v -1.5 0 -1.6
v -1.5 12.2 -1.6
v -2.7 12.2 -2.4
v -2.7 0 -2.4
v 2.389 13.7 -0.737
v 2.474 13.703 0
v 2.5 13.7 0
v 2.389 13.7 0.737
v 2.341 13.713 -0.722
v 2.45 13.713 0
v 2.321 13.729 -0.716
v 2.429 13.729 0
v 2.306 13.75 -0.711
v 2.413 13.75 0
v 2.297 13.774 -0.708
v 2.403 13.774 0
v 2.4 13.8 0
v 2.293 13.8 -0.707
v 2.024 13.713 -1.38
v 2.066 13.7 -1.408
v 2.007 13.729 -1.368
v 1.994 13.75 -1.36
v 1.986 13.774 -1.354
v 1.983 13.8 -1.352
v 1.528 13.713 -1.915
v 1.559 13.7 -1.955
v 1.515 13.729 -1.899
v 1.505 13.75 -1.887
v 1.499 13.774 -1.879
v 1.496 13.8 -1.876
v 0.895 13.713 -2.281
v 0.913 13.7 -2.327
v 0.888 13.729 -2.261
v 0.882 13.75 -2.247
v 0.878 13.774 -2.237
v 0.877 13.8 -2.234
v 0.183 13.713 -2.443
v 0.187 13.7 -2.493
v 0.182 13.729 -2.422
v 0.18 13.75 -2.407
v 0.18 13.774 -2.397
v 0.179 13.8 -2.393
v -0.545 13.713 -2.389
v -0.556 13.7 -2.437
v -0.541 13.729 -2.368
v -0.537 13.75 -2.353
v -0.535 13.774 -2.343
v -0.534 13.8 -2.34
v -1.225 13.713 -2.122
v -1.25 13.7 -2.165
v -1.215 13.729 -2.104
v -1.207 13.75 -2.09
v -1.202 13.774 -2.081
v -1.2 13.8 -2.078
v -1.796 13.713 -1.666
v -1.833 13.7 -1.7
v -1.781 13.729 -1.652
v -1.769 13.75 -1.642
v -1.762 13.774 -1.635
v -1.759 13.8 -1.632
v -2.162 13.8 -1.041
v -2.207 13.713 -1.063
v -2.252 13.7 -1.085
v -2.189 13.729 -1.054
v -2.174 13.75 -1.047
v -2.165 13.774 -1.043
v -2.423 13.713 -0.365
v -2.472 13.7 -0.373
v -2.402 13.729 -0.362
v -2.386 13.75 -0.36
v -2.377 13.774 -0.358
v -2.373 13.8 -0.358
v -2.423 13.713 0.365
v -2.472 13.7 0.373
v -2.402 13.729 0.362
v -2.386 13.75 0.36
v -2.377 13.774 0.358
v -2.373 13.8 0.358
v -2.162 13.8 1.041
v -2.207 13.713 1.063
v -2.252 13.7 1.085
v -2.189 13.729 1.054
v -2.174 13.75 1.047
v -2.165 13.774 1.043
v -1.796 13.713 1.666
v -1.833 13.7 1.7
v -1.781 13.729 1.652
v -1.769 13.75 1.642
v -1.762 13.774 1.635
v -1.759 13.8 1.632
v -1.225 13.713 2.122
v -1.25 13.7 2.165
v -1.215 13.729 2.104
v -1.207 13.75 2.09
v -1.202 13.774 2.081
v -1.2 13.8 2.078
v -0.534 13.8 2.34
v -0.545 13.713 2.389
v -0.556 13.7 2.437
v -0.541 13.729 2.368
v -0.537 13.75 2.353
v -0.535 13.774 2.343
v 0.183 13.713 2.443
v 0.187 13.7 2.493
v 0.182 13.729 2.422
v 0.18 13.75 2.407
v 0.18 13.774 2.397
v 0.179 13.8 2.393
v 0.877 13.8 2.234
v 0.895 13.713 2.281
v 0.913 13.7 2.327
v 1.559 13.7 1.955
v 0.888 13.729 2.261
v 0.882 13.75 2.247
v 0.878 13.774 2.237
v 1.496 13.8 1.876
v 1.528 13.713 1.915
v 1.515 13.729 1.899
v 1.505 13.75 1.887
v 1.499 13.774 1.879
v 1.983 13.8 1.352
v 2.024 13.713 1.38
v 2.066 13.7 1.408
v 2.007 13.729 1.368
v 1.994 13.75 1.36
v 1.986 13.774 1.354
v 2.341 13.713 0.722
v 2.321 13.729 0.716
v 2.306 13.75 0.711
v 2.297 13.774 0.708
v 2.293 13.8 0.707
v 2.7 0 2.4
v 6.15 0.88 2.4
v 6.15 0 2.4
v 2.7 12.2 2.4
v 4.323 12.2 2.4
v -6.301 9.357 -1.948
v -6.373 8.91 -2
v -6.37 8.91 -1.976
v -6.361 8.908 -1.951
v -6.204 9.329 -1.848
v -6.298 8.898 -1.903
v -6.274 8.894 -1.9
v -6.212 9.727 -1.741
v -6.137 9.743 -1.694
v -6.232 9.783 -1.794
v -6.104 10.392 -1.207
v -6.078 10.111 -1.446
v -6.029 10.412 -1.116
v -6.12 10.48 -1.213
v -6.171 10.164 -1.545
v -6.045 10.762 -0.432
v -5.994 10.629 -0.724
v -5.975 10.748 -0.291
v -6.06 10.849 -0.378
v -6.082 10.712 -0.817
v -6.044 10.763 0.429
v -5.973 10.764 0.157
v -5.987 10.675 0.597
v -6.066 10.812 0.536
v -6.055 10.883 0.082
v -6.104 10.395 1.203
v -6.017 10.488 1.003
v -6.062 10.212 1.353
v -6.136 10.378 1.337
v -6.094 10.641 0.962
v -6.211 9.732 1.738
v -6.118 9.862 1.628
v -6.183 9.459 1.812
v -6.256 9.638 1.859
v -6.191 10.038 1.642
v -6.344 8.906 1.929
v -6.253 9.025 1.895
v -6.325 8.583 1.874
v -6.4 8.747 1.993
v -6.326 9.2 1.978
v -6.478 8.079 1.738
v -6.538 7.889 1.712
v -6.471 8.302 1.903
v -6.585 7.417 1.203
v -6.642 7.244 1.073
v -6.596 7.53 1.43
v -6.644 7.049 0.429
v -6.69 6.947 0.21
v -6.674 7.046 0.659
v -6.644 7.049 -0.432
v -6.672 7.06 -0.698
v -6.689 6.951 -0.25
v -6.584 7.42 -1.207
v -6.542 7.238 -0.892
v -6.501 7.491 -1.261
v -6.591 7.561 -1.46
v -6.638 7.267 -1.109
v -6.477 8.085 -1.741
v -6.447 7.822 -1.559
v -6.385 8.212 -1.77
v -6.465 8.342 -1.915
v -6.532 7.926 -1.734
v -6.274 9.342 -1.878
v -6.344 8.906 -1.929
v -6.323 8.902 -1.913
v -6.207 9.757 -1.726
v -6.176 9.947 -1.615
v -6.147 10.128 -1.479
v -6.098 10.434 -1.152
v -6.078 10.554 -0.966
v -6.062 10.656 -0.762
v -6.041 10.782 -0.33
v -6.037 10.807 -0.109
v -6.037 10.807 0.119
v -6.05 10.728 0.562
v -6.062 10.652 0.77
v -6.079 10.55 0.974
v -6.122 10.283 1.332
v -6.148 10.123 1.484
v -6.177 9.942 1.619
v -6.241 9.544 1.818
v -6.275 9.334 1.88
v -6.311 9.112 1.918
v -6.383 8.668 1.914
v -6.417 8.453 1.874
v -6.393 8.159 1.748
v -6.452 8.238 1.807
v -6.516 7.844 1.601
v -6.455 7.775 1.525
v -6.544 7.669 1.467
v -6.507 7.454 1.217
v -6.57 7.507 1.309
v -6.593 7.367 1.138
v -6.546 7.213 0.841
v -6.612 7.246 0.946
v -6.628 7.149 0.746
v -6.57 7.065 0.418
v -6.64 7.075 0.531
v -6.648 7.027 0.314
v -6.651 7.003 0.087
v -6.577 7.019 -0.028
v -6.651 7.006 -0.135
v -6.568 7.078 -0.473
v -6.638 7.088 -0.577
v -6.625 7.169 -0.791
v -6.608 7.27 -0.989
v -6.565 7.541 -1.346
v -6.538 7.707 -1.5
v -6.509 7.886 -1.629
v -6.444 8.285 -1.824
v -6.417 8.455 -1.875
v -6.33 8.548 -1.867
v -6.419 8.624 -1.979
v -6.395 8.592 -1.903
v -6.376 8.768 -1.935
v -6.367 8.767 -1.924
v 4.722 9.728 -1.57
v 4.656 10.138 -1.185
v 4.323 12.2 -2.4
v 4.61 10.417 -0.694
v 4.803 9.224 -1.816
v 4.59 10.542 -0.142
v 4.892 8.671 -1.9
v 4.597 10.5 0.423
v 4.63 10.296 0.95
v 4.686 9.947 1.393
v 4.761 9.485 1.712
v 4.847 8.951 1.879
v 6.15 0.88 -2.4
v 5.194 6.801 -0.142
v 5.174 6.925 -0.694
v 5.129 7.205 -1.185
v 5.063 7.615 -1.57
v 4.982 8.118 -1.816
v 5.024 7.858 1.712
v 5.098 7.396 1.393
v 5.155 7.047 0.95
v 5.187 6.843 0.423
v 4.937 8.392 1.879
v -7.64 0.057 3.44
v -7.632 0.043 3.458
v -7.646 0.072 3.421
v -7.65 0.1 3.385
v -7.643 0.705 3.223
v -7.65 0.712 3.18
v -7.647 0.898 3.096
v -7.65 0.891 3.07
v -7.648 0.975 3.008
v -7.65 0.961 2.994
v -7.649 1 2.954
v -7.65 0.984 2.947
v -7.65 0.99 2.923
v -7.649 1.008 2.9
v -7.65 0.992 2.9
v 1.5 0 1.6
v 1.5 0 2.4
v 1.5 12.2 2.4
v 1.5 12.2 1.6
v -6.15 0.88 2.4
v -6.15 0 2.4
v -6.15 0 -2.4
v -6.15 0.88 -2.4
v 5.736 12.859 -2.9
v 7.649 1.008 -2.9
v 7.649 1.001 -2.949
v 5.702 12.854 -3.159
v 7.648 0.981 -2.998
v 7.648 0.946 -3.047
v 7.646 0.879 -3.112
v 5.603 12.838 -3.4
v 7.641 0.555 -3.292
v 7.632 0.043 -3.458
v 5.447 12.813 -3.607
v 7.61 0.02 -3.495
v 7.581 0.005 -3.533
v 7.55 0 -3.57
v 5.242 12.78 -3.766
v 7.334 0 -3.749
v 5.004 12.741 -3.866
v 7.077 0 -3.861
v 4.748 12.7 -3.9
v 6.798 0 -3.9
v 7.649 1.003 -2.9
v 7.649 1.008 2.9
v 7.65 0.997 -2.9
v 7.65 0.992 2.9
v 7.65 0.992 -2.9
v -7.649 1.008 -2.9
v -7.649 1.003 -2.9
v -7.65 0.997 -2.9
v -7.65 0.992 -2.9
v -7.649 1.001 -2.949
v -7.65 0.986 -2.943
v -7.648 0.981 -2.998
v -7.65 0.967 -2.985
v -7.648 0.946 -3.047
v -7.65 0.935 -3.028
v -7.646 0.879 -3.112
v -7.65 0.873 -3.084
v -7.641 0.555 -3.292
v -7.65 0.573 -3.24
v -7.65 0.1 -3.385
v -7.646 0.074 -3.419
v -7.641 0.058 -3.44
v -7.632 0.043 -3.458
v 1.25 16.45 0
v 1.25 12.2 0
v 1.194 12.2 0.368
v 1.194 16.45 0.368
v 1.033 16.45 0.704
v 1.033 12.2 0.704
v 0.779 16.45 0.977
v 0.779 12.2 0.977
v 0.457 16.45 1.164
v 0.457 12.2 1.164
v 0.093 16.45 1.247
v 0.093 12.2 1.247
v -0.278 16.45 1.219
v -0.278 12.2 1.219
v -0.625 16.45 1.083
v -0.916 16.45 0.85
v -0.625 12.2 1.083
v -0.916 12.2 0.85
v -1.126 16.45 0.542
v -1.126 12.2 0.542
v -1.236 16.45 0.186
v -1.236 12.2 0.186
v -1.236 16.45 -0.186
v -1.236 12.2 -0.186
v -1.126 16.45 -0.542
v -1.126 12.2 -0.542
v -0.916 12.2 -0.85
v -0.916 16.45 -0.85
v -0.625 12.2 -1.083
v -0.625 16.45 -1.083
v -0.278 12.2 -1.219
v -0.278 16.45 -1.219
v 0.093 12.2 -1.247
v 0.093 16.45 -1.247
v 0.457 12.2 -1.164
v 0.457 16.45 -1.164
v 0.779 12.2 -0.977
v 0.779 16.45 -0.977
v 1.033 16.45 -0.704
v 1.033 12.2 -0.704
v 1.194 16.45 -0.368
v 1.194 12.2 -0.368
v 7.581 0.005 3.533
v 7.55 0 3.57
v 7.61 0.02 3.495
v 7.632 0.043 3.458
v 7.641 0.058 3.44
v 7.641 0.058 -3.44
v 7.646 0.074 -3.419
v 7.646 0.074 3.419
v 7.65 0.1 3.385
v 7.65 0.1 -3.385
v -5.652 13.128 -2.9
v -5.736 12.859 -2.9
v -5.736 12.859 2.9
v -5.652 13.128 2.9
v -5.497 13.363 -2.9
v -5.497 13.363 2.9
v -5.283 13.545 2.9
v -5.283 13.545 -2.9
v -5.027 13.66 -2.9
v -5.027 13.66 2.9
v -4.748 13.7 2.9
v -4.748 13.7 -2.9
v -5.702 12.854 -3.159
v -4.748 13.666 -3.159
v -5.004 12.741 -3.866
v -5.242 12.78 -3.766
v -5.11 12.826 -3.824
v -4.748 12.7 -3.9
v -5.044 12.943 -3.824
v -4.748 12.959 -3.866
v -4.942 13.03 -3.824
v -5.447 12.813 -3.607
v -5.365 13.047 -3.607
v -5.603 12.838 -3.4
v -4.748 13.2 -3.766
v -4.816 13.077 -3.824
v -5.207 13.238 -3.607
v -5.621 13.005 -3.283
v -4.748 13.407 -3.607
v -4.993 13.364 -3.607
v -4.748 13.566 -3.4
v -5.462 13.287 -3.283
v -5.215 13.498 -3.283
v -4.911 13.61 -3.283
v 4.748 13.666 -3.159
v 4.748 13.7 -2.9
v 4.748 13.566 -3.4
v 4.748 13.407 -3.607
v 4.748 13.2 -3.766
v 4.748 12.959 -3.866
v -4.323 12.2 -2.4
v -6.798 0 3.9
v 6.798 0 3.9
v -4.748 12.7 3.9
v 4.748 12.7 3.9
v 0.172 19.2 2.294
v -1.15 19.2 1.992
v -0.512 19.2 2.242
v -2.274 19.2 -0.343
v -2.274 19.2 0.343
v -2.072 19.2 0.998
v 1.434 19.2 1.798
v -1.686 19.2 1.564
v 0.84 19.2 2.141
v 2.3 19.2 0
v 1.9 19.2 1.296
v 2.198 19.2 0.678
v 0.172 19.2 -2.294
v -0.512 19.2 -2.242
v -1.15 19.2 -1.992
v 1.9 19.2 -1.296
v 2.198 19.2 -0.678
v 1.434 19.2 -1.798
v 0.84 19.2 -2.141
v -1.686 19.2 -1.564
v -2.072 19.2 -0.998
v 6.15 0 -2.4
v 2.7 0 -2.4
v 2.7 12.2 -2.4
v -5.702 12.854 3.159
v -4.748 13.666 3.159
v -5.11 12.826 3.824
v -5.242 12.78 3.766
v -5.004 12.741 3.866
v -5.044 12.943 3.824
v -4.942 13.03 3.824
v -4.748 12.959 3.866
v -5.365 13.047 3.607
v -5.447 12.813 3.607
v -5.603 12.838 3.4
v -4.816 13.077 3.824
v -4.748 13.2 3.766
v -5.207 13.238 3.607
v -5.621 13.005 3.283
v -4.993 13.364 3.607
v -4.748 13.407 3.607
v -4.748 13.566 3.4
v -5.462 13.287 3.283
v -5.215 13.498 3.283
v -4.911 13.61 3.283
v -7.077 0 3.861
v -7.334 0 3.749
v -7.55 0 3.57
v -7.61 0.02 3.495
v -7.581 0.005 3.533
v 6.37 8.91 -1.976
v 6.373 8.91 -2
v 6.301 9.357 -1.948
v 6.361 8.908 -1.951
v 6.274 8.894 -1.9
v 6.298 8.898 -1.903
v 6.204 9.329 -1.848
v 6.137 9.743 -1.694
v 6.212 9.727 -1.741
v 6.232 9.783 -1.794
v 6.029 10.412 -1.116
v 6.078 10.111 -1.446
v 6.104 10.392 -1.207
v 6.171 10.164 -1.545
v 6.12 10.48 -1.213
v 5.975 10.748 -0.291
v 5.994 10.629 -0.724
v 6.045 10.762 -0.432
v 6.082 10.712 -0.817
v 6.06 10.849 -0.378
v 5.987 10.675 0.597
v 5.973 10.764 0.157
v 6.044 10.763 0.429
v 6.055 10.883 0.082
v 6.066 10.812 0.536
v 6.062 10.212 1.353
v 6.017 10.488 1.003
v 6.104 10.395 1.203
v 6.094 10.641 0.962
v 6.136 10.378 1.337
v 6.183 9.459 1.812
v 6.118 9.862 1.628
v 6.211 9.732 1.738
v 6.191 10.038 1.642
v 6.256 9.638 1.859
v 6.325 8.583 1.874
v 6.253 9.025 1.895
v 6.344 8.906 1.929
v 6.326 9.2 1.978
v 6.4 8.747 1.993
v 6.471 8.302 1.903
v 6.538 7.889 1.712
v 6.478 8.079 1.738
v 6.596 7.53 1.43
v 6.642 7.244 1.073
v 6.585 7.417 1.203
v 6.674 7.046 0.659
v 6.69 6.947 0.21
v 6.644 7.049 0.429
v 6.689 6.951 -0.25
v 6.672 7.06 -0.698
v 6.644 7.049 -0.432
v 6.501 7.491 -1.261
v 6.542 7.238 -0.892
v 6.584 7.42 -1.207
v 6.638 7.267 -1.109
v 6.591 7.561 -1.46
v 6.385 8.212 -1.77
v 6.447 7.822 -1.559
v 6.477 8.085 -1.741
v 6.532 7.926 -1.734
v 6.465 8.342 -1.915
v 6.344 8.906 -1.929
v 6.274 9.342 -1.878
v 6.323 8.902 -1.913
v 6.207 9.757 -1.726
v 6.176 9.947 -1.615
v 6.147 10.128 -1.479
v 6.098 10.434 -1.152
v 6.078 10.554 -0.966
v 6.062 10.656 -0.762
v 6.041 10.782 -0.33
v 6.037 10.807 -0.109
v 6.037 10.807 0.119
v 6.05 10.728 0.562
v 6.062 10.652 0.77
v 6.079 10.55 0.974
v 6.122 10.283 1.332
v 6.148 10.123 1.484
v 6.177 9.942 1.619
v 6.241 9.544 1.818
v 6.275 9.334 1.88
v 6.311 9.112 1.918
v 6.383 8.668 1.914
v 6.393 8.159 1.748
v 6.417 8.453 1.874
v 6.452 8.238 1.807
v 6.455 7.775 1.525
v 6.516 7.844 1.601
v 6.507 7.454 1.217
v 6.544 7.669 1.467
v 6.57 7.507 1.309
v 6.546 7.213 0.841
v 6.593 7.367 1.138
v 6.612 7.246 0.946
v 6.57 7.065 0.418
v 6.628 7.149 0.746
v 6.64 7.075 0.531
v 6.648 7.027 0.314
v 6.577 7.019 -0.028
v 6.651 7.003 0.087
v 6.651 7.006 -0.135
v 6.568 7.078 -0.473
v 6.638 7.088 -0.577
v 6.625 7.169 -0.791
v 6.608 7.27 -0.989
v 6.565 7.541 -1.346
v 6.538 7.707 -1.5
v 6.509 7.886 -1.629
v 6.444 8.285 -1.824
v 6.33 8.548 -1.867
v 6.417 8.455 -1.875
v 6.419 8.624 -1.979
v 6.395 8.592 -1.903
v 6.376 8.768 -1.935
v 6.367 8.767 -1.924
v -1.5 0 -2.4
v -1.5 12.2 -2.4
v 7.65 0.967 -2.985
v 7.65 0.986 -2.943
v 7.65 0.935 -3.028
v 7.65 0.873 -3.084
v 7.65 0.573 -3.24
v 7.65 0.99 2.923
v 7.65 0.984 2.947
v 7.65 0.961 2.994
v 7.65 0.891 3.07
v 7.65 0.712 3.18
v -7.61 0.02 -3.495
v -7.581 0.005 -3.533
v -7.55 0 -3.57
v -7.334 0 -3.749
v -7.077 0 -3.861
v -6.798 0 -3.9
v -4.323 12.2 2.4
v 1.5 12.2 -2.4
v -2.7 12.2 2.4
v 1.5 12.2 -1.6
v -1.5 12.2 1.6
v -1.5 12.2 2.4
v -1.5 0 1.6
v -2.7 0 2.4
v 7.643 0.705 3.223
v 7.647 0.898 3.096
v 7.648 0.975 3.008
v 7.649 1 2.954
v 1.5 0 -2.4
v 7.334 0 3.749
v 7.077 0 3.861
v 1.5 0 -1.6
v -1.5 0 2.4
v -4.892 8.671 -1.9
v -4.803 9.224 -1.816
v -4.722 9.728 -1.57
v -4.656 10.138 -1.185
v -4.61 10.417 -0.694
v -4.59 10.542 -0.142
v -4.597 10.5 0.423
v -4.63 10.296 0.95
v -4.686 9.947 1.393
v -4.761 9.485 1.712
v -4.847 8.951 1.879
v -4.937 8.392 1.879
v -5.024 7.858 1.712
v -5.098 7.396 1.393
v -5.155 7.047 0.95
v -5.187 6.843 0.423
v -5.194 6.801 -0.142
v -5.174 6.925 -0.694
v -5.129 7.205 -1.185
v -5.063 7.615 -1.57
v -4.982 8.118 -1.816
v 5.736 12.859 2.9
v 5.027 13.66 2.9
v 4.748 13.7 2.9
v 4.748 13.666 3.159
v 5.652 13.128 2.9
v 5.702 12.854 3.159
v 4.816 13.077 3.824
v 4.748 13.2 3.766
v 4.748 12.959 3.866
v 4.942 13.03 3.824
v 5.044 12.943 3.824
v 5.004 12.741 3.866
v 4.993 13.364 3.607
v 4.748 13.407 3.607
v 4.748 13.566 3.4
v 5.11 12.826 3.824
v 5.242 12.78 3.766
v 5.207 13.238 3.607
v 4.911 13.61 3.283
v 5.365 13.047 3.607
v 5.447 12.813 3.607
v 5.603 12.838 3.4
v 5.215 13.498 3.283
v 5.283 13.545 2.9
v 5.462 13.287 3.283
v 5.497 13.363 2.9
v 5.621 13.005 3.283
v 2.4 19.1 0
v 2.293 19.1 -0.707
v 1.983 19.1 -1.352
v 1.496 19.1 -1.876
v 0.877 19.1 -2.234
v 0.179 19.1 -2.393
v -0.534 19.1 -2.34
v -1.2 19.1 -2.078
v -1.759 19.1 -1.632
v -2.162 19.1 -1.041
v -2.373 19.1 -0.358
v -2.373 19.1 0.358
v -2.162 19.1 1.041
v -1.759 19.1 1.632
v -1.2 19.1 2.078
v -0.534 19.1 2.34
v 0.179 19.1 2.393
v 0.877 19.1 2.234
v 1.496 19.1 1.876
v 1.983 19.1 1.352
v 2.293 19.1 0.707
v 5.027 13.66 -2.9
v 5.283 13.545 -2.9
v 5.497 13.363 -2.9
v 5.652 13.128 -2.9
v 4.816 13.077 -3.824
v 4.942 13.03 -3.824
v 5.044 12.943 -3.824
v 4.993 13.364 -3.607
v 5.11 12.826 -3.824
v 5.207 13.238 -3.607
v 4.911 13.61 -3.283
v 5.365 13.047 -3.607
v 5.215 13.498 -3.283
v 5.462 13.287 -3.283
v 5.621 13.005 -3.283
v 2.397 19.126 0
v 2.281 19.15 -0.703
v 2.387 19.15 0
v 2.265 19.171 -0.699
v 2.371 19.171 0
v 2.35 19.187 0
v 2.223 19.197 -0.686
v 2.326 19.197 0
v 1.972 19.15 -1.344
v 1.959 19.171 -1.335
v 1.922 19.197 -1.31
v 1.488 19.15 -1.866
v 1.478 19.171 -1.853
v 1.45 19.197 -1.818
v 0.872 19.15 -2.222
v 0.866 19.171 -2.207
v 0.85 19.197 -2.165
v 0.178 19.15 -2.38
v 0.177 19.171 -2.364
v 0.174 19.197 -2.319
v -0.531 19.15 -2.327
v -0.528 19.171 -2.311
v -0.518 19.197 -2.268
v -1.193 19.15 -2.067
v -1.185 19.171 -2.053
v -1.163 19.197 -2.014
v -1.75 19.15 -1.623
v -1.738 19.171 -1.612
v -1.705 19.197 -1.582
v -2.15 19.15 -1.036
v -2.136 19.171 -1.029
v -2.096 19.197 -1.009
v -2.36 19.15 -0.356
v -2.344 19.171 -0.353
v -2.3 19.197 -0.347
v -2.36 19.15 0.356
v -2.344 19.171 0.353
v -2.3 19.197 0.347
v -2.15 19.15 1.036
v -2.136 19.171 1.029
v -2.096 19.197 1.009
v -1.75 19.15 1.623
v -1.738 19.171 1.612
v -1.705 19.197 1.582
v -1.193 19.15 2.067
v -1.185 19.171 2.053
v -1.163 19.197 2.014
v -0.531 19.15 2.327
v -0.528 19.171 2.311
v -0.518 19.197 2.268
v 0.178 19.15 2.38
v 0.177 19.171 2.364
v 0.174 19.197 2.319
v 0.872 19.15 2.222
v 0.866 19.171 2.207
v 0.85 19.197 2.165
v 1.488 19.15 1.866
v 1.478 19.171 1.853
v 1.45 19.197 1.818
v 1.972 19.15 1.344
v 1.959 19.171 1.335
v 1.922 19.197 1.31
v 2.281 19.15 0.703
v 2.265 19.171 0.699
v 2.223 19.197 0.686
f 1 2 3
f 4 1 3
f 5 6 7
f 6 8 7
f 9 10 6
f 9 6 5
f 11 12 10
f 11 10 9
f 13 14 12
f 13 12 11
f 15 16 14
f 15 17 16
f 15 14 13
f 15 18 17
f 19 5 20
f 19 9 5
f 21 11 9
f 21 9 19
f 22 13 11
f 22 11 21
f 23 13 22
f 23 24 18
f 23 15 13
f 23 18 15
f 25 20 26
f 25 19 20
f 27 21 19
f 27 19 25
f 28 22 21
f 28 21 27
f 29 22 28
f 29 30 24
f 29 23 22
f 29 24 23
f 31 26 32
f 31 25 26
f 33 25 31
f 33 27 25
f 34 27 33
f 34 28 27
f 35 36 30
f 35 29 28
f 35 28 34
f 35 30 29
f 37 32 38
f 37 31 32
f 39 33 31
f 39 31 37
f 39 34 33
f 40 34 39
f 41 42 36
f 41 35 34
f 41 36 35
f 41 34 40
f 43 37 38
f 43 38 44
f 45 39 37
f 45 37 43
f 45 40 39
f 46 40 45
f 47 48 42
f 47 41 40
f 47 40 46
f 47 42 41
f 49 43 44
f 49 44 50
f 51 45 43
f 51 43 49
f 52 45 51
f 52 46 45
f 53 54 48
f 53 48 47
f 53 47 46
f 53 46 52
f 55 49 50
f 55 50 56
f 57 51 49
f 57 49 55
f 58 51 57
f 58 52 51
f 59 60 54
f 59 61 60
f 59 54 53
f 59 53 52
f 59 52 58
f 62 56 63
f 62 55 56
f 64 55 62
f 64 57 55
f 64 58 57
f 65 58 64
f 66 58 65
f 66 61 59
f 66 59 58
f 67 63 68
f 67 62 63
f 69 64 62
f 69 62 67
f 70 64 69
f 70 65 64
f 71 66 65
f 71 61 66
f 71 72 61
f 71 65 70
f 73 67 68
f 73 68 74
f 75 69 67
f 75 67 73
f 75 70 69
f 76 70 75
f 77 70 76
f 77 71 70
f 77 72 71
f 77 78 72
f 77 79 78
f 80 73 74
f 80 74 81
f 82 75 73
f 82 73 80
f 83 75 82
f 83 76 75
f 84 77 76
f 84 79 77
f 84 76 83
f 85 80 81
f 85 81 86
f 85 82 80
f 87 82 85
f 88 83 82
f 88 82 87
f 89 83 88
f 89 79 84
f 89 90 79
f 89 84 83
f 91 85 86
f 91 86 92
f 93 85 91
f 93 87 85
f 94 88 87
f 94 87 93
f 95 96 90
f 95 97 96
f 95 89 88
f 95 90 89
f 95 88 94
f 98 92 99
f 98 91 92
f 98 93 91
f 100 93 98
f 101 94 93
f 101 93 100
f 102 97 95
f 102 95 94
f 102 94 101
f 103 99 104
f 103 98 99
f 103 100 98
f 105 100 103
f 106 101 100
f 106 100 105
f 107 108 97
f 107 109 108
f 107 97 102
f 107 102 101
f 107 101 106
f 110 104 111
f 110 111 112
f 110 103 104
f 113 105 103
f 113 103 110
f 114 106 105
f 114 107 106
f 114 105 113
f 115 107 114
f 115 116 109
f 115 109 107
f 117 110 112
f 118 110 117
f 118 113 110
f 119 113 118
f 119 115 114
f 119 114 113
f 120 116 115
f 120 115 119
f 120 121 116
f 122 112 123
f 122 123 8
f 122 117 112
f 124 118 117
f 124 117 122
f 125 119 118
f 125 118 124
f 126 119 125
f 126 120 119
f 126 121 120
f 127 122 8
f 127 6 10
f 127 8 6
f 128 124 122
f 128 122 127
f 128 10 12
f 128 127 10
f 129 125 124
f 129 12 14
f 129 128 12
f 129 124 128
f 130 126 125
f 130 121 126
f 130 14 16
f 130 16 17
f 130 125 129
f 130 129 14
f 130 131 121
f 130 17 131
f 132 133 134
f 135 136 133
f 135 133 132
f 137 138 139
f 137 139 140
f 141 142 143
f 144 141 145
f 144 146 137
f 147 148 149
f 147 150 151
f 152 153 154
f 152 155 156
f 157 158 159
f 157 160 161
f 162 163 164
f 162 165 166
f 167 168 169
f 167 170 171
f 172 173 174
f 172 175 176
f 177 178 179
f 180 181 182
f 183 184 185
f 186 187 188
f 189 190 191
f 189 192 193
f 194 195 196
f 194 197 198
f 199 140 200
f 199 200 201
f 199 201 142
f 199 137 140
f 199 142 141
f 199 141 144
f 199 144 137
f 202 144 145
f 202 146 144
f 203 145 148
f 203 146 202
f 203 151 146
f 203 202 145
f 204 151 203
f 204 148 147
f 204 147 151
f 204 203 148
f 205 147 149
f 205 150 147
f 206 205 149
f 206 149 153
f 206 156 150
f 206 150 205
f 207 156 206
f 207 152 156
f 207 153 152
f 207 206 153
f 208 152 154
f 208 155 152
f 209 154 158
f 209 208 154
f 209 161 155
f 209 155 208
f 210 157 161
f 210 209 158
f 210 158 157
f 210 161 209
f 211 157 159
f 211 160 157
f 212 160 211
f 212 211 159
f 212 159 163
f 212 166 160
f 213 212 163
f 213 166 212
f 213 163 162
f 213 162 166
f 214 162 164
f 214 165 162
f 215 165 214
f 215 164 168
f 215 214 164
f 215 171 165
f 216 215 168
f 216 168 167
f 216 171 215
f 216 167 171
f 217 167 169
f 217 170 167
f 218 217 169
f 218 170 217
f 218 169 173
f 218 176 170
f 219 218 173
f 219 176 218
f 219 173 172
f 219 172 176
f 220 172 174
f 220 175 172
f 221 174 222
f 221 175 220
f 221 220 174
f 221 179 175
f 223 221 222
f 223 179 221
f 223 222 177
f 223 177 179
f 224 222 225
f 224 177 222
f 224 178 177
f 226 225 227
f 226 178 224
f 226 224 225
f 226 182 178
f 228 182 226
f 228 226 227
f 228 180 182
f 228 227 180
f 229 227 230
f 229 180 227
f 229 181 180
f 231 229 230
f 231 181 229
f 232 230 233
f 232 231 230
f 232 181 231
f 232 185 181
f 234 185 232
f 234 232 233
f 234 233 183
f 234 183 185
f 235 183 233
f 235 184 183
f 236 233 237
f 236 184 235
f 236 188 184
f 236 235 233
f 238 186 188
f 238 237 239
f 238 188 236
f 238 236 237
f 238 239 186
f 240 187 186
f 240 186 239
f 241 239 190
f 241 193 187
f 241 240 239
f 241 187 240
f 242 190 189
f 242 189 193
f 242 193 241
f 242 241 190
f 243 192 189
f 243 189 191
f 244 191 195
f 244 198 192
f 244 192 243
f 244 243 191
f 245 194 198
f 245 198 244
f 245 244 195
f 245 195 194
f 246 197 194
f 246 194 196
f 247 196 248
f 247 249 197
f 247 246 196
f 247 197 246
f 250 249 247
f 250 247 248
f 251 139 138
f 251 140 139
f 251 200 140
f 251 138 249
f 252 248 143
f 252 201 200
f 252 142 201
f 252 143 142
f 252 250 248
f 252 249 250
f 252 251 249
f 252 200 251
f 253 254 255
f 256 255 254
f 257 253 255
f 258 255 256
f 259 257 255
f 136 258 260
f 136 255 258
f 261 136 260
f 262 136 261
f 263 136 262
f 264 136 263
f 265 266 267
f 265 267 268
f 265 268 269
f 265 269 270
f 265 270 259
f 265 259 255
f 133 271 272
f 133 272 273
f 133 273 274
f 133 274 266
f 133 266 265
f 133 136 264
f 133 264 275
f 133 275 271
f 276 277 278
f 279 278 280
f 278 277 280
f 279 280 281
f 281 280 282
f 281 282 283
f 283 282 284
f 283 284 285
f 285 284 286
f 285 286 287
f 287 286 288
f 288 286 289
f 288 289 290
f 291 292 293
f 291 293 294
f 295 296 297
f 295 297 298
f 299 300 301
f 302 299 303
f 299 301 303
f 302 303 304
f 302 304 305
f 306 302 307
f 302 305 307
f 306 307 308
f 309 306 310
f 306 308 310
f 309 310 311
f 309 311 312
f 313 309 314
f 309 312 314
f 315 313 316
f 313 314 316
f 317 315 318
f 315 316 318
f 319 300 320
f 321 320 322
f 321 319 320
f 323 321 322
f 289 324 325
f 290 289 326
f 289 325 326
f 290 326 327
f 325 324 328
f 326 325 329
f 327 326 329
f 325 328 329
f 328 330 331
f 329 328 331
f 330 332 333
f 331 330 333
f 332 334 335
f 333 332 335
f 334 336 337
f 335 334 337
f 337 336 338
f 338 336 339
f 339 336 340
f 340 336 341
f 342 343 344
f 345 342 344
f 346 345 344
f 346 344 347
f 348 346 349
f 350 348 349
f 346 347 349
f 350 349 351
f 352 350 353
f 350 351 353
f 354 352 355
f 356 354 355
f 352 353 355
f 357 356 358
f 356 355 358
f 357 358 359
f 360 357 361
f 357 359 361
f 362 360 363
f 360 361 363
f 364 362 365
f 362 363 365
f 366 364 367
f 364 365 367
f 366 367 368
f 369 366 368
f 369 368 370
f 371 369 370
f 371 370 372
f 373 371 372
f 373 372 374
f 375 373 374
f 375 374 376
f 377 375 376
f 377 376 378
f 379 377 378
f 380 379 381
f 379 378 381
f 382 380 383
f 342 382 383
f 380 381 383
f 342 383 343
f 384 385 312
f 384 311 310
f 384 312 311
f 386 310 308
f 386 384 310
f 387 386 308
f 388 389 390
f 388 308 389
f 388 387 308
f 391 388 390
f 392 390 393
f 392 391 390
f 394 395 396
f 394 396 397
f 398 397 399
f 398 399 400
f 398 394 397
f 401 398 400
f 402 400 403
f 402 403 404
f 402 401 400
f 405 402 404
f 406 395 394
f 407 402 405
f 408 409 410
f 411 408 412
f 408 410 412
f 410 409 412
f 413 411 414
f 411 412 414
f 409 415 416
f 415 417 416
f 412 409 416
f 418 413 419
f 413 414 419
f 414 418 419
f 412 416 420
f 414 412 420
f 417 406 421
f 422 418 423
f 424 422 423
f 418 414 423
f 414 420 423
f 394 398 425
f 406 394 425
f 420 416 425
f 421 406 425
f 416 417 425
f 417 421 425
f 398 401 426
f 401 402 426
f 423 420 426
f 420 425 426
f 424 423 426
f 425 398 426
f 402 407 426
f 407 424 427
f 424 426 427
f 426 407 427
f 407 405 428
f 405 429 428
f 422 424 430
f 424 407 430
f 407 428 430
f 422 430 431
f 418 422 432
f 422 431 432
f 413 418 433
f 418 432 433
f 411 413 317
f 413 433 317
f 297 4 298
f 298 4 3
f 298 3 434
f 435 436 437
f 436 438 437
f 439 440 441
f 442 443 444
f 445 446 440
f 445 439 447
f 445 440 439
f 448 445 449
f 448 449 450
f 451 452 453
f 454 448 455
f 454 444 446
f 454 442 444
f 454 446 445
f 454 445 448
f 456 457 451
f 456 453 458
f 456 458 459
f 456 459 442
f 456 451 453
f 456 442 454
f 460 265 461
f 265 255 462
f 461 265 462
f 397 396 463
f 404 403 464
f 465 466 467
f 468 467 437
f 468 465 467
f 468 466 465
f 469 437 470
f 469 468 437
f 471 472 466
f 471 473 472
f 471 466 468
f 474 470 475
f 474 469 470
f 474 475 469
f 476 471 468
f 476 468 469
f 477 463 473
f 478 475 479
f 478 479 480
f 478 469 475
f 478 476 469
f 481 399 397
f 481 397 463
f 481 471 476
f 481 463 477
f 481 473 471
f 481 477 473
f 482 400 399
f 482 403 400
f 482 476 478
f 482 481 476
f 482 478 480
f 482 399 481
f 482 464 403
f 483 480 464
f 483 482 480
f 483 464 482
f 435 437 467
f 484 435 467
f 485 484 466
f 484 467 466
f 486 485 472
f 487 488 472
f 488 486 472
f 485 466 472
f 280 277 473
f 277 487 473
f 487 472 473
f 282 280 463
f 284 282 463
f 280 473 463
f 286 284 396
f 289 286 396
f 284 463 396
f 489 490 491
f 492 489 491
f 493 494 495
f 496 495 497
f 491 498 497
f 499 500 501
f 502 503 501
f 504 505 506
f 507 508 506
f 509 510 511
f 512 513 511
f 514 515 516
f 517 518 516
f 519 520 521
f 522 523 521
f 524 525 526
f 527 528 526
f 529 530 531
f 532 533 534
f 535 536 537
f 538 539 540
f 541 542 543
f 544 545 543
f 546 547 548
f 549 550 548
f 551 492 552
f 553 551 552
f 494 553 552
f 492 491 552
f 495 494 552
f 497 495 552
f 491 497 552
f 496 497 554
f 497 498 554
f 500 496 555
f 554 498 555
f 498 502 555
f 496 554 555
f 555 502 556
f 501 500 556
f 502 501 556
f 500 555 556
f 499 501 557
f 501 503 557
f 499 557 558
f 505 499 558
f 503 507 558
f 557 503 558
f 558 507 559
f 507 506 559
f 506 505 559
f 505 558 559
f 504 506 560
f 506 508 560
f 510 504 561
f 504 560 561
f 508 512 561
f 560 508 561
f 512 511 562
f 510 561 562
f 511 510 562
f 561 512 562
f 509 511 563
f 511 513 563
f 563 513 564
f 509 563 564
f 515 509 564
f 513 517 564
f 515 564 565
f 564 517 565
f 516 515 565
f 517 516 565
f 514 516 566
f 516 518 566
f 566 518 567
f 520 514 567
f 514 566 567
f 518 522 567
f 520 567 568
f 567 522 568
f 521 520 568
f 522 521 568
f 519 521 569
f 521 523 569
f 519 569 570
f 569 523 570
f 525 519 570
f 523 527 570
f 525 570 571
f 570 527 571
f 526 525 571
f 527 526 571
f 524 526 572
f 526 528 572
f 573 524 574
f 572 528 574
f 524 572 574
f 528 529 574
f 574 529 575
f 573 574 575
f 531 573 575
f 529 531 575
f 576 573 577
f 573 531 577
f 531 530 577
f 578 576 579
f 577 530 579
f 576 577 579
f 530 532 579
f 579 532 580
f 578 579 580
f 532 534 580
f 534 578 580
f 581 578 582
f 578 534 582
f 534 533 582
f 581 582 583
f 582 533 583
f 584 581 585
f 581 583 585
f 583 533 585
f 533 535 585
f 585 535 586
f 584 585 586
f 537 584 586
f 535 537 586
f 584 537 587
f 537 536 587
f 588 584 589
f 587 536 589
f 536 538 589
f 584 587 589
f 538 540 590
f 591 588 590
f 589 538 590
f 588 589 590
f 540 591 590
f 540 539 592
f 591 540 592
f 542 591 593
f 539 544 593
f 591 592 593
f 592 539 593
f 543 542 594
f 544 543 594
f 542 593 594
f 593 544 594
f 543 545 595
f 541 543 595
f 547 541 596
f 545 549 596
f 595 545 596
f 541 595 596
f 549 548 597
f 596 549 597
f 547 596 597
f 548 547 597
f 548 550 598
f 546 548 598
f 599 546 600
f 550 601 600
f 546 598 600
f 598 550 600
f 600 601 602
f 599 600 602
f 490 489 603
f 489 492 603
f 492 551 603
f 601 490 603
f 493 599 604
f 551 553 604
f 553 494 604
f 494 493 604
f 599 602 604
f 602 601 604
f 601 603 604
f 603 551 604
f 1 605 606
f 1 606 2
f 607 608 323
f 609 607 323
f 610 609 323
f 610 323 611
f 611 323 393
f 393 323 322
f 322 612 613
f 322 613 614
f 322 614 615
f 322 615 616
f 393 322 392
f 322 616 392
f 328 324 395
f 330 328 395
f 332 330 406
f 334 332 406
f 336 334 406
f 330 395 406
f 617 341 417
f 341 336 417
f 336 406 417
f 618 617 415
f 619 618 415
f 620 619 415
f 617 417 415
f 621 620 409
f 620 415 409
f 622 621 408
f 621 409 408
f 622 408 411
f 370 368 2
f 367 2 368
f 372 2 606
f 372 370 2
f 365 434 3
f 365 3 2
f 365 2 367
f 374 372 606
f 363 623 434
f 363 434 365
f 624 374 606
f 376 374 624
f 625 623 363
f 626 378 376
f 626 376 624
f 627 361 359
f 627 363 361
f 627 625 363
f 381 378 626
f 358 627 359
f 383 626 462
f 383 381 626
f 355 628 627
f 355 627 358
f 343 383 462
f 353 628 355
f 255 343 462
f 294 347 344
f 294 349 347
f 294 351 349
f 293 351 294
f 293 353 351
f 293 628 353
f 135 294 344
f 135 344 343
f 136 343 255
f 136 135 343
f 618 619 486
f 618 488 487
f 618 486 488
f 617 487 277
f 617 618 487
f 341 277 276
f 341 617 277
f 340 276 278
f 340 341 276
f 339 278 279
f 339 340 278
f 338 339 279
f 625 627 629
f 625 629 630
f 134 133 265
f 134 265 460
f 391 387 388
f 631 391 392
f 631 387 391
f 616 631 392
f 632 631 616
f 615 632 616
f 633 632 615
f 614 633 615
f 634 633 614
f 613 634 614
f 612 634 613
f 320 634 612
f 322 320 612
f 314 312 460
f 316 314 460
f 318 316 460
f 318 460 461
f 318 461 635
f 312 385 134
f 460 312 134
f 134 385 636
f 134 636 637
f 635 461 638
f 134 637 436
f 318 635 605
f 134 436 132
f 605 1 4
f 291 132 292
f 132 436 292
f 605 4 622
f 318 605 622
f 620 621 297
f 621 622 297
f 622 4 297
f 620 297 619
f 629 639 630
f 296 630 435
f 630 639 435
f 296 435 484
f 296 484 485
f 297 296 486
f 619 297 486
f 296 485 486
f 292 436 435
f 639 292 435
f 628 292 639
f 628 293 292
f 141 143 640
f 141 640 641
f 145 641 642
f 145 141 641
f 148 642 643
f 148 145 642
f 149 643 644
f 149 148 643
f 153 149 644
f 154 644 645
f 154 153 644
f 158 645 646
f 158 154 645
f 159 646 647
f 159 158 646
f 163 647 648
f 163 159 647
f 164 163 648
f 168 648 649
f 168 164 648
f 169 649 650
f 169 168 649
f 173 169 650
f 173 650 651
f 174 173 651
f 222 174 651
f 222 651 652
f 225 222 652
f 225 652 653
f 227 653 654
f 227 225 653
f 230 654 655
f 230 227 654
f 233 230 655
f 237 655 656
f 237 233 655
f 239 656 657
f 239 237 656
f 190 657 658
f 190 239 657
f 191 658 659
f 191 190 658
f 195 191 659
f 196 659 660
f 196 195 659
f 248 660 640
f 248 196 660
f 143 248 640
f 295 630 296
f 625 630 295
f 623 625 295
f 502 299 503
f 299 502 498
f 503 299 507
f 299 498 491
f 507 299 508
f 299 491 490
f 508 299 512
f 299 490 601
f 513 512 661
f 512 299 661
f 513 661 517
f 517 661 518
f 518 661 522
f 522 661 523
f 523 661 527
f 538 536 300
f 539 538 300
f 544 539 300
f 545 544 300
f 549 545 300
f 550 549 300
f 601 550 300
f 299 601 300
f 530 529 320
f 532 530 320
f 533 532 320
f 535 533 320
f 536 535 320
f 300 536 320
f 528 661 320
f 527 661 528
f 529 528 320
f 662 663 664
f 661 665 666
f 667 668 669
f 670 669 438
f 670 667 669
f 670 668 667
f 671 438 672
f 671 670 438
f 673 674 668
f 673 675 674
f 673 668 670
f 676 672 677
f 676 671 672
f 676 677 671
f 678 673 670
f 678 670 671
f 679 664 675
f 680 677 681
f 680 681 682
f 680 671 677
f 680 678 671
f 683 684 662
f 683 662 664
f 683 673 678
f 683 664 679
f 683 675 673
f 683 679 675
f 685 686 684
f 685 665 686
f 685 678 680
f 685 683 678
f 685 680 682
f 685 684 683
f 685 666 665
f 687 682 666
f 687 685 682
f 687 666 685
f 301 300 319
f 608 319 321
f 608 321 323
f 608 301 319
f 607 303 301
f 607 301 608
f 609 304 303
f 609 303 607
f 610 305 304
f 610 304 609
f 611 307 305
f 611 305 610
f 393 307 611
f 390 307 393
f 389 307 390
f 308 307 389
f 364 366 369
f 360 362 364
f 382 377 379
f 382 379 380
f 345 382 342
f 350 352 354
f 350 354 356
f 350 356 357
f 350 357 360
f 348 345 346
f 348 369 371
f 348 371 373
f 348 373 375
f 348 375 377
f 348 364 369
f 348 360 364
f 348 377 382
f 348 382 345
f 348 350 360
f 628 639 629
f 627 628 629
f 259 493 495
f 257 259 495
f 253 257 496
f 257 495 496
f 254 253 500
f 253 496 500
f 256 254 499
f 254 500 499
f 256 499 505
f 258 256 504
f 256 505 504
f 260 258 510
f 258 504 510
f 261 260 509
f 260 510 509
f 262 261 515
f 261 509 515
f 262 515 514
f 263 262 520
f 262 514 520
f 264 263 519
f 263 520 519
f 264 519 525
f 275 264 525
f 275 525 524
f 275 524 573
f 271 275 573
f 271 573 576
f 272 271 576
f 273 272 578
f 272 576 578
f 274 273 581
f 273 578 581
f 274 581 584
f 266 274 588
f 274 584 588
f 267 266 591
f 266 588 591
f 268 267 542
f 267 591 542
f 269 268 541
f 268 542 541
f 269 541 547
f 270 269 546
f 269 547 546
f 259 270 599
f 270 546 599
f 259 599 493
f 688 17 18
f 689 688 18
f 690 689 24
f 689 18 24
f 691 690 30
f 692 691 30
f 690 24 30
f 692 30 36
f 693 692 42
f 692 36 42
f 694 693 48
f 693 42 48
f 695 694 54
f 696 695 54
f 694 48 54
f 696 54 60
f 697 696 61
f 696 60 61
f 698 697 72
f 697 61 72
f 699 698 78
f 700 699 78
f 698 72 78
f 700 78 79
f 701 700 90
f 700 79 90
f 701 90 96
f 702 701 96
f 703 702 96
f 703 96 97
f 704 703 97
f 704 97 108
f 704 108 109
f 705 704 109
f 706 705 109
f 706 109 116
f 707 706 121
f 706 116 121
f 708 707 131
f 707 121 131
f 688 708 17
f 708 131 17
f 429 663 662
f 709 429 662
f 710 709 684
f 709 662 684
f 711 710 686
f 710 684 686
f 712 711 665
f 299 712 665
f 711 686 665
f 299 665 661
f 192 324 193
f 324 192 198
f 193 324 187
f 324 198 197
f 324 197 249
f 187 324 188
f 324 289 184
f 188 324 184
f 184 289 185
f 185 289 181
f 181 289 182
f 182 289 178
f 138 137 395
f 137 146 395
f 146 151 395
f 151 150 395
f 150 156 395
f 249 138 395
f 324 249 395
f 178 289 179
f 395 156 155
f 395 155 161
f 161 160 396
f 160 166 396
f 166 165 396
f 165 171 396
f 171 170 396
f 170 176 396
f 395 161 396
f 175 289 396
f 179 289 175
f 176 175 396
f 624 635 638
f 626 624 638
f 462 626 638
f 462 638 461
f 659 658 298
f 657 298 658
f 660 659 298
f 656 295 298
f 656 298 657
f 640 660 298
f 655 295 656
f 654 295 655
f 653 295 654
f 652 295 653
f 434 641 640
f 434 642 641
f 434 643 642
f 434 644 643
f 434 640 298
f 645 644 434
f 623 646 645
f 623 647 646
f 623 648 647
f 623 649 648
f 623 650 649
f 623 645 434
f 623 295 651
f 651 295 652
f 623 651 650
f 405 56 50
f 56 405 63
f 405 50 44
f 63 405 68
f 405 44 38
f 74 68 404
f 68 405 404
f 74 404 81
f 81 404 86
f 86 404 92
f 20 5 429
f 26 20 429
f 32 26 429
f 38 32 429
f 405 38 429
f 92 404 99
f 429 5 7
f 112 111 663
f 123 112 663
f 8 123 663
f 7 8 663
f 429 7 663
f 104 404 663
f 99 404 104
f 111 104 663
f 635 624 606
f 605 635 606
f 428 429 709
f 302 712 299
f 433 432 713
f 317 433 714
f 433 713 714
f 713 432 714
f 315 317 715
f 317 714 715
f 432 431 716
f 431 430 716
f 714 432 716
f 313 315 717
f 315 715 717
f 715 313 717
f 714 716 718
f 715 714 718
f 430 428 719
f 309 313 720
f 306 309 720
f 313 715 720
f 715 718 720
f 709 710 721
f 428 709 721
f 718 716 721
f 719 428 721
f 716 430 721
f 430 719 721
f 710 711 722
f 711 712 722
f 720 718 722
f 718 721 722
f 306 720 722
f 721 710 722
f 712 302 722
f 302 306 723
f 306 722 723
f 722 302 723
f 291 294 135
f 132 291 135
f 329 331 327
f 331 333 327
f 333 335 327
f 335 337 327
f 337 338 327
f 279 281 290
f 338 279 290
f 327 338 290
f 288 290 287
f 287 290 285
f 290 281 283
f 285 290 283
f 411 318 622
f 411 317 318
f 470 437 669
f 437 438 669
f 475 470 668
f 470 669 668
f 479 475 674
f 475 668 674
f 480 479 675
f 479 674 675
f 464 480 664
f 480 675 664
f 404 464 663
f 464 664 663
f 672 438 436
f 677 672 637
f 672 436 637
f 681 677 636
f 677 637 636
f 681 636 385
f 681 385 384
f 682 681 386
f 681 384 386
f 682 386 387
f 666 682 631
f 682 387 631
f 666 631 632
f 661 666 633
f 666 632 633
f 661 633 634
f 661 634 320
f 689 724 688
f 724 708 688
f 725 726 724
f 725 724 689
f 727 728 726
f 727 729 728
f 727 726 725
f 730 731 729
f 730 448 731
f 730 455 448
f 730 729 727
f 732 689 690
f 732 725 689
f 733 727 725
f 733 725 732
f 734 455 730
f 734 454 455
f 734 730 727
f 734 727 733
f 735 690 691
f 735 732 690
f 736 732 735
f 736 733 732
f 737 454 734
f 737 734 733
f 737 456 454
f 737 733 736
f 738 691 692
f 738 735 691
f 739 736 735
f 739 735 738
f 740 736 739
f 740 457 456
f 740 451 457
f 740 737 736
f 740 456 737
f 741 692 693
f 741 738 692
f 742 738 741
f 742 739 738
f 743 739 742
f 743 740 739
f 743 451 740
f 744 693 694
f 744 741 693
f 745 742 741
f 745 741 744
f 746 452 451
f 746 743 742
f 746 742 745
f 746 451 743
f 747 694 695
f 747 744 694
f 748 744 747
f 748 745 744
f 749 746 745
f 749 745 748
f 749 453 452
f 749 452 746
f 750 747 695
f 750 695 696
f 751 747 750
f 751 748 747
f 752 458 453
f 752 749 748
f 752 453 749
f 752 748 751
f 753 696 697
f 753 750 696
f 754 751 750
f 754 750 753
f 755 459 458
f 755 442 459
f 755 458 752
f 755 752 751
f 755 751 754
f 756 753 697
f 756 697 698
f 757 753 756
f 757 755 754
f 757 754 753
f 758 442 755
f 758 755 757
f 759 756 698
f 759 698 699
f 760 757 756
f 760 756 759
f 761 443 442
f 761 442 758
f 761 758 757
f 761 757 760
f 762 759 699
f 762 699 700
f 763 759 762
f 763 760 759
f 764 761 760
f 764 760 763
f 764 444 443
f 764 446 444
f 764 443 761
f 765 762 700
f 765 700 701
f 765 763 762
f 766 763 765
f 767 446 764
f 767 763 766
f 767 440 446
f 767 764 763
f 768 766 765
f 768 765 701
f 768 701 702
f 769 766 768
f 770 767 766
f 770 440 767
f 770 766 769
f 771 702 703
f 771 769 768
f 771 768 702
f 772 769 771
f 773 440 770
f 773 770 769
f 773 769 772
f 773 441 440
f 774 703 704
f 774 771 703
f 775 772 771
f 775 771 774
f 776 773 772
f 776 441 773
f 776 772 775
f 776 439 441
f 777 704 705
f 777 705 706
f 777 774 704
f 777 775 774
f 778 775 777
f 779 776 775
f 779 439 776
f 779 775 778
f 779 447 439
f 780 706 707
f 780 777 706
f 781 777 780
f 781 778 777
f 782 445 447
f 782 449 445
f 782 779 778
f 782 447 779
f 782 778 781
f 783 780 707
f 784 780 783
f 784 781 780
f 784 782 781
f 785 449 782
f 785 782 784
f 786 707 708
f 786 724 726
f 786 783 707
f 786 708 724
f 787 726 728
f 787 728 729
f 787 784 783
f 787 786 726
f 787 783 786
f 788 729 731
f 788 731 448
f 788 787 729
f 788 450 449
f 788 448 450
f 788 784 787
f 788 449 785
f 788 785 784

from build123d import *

# Parameters (mm, degrees)
SALIENTE_EXTRUIR1_DEPTH = 3.9
VACIADO1_T              = -1.5
CROQUIS2_R              = 1.9
CORTAR_EXTRUIR1_DEPTH   = 1.5
SALIENTE_EXTRUIR2_DEPTH = 12.2
CROQUIS4_R              = 2.4
SALIENTE_EXTRUIR3_DEPTH = 5.5
CROQUIS5_R              = 1.25
CORTAR_EXTRUIR2_DEPTH   = 4.25
REDONDEO1_R             = 1
REDONDEO2_R             = 0.1


with BuildPart() as part:
    # Croquis1 → Saliente-Extruir1 (new body, symmetric)
    with BuildSketch(Plane.XY):
        Polygon((7.65, 0), (-7.65, 0), (-7.65, 1), (-5.6, 13.7), (5.6, 13.7), (7.65, 1), align=None)
    extrude(amount=SALIENTE_EXTRUIR1_DEPTH, both=True)

    # Vaciado1
    vaciado1_openings = [part.faces().sort_by_distance(p)[0] for p in [
        (0, 0, 0),
    ]]
    offset(amount=VACIADO1_T, openings=vaciado1_openings, kind=Kind.INTERSECTION)

    # Croquis2 → Cortar-Extruir1 (cut)
    with BuildSketch(Plane(origin=(7.613054972, 1.228878952, 0), x_dir=(0, 0, -1), z_dir=(0.987221404, 0.159354636, 0))):
        with Locations((0, 7.780937034)):
            Circle(CROQUIS2_R)
    cortar_extruir1 = extrude(amount=-CORTAR_EXTRUIR1_DEPTH, mode=Mode.SUBTRACT)

    # Simetría1: Cortar-Extruir1 across plane
    add(cortar_extruir1.mirror(Plane(origin=(0, 0, 0), x_dir=(0, 0, 1), z_dir=(1, 0, 0))), mode=Mode.SUBTRACT)

    # Croquis3 → Saliente-Extruir2 (add)
    with BuildSketch(Plane.XZ):
        Polygon((1.5, 2.4), (1.5, 1.6), (2.7, 2.4), align=None)
        Polygon((-1.5, 1.6), (-2.7, 2.4), (-1.5, 2.4), align=None)
    saliente_extruir2 = extrude(amount=-SALIENTE_EXTRUIR2_DEPTH)

    # Simetría2: Saliente-Extruir2 across plane
    add(saliente_extruir2.mirror(Plane.XY))

    # Croquis4 → Saliente-Extruir3 (add)
    with BuildSketch(Plane(origin=(0, 13.7, 0), x_dir=(1, 0, 0), z_dir=(0, 1, 0))):
        Circle(CROQUIS4_R)
    extrude(amount=SALIENTE_EXTRUIR3_DEPTH)

    # Croquis5 → Cortar-Extruir2 (cut)
    with BuildSketch(Plane.XZ.offset(-12.2)):
        Circle(CROQUIS5_R)
    extrude(amount=-CORTAR_EXTRUIR2_DEPTH, mode=Mode.SUBTRACT)

    # Redondeo1
    redondeo1_edges = [part.edges().sort_by_distance(p)[0] for p in [
        (6.625, 7.35, -3.9),
        (-6.625, 7.35, -3.9),
        (-6.625, 7.35, 3.9),
        (6.625, 7.35, 3.9),
        (5.6, 13.7, 0),
        (0, 13.7, -3.9),
        (0, 13.7, 3.9),
        (-5.6, 13.7, 0),
    ]]
    fillet(redondeo1_edges, radius=REDONDEO1_R)

    # Redondeo2
    redondeo2_edges = [part.edges().sort_by_distance(p)[0] for p in [
        (-7.65, 0.566832693, 3.265088592),
        (-7.65, 0, 0),
        (-7.65, 0.566832693, -3.265088592),
        (-7.65, 1, 0),
        (7.65, 0.566832693, 3.265088592),
        (7.65, 1, 0),
        (7.65, 0.566832693, -3.265088592),
        (7.65, 0, 0),
        (-2.4, 13.7, 0),
        (-2.4, 19.2, 0),
        (-6.373126583, 8.910386534, 1.9),
        (6.373126583, 8.910386534, 1.9),
    ]]
    fillet(redondeo2_edges, radius=REDONDEO2_R)


solid = part.part
